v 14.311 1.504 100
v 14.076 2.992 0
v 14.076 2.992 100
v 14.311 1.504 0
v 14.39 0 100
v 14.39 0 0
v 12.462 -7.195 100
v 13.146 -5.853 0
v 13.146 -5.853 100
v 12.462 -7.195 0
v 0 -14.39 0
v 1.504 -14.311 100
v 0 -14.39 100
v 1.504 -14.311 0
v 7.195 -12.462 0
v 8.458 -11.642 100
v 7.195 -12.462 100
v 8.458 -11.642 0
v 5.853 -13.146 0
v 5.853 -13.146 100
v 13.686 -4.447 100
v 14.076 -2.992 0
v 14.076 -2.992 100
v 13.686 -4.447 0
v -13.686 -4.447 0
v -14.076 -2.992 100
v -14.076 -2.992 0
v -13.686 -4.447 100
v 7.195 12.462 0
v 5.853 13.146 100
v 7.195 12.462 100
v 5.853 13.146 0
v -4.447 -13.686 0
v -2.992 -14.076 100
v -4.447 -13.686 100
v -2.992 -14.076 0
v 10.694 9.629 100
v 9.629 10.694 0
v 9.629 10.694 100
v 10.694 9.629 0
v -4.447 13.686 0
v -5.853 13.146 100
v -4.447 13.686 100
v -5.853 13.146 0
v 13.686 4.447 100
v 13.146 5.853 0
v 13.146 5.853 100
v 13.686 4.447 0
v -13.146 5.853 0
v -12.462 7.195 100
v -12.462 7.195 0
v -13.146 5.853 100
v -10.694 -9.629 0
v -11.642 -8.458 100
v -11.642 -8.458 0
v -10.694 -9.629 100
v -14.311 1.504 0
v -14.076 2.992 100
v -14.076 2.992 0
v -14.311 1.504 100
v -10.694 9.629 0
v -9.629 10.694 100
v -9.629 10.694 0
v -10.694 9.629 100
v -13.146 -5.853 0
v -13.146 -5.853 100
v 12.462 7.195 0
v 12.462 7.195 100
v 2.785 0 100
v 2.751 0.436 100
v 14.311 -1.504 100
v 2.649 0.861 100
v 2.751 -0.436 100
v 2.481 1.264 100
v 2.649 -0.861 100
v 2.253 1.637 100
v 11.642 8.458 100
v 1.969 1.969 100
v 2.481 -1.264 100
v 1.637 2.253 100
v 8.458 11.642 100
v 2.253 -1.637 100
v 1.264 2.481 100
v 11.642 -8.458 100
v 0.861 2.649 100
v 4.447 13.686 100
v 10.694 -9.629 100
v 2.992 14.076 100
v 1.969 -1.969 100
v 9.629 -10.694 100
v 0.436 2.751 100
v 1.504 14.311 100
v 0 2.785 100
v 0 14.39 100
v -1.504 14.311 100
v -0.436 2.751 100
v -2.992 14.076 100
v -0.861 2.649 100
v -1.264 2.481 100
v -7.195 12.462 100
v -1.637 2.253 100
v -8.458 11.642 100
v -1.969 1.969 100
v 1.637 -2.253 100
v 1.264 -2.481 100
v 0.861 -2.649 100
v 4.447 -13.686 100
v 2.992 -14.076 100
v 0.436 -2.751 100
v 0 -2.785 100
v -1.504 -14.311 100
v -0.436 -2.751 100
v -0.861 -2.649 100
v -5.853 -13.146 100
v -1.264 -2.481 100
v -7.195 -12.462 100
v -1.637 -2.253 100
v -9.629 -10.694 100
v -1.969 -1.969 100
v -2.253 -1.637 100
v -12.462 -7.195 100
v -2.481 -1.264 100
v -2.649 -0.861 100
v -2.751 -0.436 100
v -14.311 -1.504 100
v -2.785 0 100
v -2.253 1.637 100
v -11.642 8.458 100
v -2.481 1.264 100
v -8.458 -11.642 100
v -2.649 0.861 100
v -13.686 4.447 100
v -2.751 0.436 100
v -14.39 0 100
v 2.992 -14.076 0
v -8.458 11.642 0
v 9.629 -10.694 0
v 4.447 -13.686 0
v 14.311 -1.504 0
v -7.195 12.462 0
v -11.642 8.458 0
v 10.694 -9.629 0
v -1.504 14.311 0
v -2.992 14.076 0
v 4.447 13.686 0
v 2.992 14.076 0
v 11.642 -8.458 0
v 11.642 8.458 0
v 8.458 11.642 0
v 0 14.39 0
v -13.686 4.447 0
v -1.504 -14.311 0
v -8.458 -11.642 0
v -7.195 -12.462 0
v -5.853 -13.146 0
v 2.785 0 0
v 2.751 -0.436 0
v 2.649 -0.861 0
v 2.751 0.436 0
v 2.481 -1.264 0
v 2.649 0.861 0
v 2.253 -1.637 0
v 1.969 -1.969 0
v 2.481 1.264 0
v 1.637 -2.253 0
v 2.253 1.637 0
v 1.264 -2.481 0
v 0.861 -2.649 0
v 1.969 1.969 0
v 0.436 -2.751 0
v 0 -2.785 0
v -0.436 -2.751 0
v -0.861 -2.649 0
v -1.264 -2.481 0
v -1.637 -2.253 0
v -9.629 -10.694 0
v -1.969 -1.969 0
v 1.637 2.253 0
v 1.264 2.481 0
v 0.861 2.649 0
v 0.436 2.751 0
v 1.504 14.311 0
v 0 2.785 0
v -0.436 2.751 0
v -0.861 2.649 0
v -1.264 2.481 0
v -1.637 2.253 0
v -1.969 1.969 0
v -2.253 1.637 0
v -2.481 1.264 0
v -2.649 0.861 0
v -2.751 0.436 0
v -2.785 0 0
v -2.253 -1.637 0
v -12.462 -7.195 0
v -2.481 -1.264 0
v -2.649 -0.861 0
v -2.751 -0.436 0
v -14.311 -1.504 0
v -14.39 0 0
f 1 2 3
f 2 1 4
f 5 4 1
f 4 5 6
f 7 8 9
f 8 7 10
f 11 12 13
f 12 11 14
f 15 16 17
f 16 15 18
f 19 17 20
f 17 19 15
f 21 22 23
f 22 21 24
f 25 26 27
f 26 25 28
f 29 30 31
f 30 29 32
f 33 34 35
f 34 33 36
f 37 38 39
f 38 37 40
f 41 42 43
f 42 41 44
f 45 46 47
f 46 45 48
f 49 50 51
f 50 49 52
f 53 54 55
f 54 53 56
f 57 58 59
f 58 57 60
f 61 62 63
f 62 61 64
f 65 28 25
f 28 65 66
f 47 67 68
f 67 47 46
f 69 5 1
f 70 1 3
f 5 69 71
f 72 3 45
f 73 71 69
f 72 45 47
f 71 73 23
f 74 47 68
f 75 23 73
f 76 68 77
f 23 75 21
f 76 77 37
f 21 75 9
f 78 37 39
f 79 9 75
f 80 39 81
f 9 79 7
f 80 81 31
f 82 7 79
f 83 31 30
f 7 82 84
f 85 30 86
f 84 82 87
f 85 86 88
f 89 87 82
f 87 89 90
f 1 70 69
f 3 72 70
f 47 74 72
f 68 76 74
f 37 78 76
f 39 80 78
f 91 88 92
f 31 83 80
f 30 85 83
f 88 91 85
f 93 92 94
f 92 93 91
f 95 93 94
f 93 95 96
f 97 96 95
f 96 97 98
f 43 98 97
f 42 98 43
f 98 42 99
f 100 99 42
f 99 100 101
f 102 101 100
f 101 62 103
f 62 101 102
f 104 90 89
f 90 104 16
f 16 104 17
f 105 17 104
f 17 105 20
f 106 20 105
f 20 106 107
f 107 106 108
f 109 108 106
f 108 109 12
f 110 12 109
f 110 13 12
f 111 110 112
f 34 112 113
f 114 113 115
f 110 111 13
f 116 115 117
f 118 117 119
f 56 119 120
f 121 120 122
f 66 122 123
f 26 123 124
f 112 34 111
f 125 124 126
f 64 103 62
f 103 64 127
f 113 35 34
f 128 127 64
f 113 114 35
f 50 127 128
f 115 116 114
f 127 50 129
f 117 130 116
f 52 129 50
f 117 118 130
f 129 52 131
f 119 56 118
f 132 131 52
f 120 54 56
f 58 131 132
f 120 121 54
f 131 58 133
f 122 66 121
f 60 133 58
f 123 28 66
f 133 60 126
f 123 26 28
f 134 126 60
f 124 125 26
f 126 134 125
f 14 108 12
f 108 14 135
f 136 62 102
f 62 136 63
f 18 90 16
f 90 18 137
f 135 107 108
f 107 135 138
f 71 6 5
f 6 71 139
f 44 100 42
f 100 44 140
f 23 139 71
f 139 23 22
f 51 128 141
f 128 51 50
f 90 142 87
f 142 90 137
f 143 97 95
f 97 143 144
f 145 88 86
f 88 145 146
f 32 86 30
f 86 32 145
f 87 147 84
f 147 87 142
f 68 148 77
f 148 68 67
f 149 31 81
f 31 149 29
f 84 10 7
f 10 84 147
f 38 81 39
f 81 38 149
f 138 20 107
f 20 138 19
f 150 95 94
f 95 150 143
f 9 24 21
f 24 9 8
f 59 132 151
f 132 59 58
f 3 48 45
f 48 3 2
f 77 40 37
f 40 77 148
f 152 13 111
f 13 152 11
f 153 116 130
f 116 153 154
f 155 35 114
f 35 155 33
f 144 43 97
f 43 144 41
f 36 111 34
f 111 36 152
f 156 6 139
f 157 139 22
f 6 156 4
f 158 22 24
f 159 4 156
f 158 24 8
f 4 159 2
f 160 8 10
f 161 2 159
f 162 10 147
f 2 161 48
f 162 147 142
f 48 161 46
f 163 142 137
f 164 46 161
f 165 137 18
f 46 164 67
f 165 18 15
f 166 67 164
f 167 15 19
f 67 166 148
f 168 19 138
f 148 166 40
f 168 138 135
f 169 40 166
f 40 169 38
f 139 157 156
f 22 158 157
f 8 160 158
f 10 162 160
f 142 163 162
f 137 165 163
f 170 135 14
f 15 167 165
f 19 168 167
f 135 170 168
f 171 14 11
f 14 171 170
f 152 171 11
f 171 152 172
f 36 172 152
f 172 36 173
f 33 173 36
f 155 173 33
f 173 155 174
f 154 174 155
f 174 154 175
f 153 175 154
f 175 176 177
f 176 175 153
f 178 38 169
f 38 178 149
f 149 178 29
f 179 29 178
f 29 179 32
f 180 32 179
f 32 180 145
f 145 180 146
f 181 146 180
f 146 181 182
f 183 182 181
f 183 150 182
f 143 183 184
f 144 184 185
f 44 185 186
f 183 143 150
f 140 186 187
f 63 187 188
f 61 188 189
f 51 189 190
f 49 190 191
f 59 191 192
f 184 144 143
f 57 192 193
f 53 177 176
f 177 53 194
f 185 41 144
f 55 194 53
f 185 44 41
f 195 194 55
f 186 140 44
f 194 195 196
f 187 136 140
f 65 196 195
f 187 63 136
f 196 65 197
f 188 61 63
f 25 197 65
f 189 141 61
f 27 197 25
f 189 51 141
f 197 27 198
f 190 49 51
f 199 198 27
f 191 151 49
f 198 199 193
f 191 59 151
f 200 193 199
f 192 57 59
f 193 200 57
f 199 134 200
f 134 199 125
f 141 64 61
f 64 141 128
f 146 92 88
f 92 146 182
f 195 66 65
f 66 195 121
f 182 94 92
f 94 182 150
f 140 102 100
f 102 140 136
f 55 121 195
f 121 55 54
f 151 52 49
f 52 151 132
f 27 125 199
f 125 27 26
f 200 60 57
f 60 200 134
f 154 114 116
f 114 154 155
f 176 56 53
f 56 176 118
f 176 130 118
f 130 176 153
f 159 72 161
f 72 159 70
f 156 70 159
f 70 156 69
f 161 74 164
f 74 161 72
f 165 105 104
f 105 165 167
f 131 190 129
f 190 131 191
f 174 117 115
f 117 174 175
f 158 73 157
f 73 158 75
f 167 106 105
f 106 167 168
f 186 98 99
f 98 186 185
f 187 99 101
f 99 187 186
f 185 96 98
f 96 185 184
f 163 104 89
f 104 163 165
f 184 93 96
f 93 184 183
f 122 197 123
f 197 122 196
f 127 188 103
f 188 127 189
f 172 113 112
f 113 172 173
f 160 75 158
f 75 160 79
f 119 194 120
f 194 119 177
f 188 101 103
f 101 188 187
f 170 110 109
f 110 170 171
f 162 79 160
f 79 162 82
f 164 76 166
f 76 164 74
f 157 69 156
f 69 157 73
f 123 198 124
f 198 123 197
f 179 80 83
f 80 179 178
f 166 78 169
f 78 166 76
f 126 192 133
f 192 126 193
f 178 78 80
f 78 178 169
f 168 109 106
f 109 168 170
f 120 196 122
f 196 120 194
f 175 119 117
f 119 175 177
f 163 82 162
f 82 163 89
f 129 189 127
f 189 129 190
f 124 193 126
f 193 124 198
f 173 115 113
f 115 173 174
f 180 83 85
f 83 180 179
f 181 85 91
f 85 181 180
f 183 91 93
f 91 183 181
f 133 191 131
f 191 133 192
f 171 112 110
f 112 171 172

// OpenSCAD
        wall_thickness = 2.51;
        bore_clearance = 0.785;
        roller_radius = 14.39;

        module roller() {
            difference() {
                cylinder(h=100, r=roller_radius, $fn=60);
                translate([0,0,-5])
                    cylinder(h=110, r=bore_clearance + 2, $fn=40);
            }
        }
        roller();
        
